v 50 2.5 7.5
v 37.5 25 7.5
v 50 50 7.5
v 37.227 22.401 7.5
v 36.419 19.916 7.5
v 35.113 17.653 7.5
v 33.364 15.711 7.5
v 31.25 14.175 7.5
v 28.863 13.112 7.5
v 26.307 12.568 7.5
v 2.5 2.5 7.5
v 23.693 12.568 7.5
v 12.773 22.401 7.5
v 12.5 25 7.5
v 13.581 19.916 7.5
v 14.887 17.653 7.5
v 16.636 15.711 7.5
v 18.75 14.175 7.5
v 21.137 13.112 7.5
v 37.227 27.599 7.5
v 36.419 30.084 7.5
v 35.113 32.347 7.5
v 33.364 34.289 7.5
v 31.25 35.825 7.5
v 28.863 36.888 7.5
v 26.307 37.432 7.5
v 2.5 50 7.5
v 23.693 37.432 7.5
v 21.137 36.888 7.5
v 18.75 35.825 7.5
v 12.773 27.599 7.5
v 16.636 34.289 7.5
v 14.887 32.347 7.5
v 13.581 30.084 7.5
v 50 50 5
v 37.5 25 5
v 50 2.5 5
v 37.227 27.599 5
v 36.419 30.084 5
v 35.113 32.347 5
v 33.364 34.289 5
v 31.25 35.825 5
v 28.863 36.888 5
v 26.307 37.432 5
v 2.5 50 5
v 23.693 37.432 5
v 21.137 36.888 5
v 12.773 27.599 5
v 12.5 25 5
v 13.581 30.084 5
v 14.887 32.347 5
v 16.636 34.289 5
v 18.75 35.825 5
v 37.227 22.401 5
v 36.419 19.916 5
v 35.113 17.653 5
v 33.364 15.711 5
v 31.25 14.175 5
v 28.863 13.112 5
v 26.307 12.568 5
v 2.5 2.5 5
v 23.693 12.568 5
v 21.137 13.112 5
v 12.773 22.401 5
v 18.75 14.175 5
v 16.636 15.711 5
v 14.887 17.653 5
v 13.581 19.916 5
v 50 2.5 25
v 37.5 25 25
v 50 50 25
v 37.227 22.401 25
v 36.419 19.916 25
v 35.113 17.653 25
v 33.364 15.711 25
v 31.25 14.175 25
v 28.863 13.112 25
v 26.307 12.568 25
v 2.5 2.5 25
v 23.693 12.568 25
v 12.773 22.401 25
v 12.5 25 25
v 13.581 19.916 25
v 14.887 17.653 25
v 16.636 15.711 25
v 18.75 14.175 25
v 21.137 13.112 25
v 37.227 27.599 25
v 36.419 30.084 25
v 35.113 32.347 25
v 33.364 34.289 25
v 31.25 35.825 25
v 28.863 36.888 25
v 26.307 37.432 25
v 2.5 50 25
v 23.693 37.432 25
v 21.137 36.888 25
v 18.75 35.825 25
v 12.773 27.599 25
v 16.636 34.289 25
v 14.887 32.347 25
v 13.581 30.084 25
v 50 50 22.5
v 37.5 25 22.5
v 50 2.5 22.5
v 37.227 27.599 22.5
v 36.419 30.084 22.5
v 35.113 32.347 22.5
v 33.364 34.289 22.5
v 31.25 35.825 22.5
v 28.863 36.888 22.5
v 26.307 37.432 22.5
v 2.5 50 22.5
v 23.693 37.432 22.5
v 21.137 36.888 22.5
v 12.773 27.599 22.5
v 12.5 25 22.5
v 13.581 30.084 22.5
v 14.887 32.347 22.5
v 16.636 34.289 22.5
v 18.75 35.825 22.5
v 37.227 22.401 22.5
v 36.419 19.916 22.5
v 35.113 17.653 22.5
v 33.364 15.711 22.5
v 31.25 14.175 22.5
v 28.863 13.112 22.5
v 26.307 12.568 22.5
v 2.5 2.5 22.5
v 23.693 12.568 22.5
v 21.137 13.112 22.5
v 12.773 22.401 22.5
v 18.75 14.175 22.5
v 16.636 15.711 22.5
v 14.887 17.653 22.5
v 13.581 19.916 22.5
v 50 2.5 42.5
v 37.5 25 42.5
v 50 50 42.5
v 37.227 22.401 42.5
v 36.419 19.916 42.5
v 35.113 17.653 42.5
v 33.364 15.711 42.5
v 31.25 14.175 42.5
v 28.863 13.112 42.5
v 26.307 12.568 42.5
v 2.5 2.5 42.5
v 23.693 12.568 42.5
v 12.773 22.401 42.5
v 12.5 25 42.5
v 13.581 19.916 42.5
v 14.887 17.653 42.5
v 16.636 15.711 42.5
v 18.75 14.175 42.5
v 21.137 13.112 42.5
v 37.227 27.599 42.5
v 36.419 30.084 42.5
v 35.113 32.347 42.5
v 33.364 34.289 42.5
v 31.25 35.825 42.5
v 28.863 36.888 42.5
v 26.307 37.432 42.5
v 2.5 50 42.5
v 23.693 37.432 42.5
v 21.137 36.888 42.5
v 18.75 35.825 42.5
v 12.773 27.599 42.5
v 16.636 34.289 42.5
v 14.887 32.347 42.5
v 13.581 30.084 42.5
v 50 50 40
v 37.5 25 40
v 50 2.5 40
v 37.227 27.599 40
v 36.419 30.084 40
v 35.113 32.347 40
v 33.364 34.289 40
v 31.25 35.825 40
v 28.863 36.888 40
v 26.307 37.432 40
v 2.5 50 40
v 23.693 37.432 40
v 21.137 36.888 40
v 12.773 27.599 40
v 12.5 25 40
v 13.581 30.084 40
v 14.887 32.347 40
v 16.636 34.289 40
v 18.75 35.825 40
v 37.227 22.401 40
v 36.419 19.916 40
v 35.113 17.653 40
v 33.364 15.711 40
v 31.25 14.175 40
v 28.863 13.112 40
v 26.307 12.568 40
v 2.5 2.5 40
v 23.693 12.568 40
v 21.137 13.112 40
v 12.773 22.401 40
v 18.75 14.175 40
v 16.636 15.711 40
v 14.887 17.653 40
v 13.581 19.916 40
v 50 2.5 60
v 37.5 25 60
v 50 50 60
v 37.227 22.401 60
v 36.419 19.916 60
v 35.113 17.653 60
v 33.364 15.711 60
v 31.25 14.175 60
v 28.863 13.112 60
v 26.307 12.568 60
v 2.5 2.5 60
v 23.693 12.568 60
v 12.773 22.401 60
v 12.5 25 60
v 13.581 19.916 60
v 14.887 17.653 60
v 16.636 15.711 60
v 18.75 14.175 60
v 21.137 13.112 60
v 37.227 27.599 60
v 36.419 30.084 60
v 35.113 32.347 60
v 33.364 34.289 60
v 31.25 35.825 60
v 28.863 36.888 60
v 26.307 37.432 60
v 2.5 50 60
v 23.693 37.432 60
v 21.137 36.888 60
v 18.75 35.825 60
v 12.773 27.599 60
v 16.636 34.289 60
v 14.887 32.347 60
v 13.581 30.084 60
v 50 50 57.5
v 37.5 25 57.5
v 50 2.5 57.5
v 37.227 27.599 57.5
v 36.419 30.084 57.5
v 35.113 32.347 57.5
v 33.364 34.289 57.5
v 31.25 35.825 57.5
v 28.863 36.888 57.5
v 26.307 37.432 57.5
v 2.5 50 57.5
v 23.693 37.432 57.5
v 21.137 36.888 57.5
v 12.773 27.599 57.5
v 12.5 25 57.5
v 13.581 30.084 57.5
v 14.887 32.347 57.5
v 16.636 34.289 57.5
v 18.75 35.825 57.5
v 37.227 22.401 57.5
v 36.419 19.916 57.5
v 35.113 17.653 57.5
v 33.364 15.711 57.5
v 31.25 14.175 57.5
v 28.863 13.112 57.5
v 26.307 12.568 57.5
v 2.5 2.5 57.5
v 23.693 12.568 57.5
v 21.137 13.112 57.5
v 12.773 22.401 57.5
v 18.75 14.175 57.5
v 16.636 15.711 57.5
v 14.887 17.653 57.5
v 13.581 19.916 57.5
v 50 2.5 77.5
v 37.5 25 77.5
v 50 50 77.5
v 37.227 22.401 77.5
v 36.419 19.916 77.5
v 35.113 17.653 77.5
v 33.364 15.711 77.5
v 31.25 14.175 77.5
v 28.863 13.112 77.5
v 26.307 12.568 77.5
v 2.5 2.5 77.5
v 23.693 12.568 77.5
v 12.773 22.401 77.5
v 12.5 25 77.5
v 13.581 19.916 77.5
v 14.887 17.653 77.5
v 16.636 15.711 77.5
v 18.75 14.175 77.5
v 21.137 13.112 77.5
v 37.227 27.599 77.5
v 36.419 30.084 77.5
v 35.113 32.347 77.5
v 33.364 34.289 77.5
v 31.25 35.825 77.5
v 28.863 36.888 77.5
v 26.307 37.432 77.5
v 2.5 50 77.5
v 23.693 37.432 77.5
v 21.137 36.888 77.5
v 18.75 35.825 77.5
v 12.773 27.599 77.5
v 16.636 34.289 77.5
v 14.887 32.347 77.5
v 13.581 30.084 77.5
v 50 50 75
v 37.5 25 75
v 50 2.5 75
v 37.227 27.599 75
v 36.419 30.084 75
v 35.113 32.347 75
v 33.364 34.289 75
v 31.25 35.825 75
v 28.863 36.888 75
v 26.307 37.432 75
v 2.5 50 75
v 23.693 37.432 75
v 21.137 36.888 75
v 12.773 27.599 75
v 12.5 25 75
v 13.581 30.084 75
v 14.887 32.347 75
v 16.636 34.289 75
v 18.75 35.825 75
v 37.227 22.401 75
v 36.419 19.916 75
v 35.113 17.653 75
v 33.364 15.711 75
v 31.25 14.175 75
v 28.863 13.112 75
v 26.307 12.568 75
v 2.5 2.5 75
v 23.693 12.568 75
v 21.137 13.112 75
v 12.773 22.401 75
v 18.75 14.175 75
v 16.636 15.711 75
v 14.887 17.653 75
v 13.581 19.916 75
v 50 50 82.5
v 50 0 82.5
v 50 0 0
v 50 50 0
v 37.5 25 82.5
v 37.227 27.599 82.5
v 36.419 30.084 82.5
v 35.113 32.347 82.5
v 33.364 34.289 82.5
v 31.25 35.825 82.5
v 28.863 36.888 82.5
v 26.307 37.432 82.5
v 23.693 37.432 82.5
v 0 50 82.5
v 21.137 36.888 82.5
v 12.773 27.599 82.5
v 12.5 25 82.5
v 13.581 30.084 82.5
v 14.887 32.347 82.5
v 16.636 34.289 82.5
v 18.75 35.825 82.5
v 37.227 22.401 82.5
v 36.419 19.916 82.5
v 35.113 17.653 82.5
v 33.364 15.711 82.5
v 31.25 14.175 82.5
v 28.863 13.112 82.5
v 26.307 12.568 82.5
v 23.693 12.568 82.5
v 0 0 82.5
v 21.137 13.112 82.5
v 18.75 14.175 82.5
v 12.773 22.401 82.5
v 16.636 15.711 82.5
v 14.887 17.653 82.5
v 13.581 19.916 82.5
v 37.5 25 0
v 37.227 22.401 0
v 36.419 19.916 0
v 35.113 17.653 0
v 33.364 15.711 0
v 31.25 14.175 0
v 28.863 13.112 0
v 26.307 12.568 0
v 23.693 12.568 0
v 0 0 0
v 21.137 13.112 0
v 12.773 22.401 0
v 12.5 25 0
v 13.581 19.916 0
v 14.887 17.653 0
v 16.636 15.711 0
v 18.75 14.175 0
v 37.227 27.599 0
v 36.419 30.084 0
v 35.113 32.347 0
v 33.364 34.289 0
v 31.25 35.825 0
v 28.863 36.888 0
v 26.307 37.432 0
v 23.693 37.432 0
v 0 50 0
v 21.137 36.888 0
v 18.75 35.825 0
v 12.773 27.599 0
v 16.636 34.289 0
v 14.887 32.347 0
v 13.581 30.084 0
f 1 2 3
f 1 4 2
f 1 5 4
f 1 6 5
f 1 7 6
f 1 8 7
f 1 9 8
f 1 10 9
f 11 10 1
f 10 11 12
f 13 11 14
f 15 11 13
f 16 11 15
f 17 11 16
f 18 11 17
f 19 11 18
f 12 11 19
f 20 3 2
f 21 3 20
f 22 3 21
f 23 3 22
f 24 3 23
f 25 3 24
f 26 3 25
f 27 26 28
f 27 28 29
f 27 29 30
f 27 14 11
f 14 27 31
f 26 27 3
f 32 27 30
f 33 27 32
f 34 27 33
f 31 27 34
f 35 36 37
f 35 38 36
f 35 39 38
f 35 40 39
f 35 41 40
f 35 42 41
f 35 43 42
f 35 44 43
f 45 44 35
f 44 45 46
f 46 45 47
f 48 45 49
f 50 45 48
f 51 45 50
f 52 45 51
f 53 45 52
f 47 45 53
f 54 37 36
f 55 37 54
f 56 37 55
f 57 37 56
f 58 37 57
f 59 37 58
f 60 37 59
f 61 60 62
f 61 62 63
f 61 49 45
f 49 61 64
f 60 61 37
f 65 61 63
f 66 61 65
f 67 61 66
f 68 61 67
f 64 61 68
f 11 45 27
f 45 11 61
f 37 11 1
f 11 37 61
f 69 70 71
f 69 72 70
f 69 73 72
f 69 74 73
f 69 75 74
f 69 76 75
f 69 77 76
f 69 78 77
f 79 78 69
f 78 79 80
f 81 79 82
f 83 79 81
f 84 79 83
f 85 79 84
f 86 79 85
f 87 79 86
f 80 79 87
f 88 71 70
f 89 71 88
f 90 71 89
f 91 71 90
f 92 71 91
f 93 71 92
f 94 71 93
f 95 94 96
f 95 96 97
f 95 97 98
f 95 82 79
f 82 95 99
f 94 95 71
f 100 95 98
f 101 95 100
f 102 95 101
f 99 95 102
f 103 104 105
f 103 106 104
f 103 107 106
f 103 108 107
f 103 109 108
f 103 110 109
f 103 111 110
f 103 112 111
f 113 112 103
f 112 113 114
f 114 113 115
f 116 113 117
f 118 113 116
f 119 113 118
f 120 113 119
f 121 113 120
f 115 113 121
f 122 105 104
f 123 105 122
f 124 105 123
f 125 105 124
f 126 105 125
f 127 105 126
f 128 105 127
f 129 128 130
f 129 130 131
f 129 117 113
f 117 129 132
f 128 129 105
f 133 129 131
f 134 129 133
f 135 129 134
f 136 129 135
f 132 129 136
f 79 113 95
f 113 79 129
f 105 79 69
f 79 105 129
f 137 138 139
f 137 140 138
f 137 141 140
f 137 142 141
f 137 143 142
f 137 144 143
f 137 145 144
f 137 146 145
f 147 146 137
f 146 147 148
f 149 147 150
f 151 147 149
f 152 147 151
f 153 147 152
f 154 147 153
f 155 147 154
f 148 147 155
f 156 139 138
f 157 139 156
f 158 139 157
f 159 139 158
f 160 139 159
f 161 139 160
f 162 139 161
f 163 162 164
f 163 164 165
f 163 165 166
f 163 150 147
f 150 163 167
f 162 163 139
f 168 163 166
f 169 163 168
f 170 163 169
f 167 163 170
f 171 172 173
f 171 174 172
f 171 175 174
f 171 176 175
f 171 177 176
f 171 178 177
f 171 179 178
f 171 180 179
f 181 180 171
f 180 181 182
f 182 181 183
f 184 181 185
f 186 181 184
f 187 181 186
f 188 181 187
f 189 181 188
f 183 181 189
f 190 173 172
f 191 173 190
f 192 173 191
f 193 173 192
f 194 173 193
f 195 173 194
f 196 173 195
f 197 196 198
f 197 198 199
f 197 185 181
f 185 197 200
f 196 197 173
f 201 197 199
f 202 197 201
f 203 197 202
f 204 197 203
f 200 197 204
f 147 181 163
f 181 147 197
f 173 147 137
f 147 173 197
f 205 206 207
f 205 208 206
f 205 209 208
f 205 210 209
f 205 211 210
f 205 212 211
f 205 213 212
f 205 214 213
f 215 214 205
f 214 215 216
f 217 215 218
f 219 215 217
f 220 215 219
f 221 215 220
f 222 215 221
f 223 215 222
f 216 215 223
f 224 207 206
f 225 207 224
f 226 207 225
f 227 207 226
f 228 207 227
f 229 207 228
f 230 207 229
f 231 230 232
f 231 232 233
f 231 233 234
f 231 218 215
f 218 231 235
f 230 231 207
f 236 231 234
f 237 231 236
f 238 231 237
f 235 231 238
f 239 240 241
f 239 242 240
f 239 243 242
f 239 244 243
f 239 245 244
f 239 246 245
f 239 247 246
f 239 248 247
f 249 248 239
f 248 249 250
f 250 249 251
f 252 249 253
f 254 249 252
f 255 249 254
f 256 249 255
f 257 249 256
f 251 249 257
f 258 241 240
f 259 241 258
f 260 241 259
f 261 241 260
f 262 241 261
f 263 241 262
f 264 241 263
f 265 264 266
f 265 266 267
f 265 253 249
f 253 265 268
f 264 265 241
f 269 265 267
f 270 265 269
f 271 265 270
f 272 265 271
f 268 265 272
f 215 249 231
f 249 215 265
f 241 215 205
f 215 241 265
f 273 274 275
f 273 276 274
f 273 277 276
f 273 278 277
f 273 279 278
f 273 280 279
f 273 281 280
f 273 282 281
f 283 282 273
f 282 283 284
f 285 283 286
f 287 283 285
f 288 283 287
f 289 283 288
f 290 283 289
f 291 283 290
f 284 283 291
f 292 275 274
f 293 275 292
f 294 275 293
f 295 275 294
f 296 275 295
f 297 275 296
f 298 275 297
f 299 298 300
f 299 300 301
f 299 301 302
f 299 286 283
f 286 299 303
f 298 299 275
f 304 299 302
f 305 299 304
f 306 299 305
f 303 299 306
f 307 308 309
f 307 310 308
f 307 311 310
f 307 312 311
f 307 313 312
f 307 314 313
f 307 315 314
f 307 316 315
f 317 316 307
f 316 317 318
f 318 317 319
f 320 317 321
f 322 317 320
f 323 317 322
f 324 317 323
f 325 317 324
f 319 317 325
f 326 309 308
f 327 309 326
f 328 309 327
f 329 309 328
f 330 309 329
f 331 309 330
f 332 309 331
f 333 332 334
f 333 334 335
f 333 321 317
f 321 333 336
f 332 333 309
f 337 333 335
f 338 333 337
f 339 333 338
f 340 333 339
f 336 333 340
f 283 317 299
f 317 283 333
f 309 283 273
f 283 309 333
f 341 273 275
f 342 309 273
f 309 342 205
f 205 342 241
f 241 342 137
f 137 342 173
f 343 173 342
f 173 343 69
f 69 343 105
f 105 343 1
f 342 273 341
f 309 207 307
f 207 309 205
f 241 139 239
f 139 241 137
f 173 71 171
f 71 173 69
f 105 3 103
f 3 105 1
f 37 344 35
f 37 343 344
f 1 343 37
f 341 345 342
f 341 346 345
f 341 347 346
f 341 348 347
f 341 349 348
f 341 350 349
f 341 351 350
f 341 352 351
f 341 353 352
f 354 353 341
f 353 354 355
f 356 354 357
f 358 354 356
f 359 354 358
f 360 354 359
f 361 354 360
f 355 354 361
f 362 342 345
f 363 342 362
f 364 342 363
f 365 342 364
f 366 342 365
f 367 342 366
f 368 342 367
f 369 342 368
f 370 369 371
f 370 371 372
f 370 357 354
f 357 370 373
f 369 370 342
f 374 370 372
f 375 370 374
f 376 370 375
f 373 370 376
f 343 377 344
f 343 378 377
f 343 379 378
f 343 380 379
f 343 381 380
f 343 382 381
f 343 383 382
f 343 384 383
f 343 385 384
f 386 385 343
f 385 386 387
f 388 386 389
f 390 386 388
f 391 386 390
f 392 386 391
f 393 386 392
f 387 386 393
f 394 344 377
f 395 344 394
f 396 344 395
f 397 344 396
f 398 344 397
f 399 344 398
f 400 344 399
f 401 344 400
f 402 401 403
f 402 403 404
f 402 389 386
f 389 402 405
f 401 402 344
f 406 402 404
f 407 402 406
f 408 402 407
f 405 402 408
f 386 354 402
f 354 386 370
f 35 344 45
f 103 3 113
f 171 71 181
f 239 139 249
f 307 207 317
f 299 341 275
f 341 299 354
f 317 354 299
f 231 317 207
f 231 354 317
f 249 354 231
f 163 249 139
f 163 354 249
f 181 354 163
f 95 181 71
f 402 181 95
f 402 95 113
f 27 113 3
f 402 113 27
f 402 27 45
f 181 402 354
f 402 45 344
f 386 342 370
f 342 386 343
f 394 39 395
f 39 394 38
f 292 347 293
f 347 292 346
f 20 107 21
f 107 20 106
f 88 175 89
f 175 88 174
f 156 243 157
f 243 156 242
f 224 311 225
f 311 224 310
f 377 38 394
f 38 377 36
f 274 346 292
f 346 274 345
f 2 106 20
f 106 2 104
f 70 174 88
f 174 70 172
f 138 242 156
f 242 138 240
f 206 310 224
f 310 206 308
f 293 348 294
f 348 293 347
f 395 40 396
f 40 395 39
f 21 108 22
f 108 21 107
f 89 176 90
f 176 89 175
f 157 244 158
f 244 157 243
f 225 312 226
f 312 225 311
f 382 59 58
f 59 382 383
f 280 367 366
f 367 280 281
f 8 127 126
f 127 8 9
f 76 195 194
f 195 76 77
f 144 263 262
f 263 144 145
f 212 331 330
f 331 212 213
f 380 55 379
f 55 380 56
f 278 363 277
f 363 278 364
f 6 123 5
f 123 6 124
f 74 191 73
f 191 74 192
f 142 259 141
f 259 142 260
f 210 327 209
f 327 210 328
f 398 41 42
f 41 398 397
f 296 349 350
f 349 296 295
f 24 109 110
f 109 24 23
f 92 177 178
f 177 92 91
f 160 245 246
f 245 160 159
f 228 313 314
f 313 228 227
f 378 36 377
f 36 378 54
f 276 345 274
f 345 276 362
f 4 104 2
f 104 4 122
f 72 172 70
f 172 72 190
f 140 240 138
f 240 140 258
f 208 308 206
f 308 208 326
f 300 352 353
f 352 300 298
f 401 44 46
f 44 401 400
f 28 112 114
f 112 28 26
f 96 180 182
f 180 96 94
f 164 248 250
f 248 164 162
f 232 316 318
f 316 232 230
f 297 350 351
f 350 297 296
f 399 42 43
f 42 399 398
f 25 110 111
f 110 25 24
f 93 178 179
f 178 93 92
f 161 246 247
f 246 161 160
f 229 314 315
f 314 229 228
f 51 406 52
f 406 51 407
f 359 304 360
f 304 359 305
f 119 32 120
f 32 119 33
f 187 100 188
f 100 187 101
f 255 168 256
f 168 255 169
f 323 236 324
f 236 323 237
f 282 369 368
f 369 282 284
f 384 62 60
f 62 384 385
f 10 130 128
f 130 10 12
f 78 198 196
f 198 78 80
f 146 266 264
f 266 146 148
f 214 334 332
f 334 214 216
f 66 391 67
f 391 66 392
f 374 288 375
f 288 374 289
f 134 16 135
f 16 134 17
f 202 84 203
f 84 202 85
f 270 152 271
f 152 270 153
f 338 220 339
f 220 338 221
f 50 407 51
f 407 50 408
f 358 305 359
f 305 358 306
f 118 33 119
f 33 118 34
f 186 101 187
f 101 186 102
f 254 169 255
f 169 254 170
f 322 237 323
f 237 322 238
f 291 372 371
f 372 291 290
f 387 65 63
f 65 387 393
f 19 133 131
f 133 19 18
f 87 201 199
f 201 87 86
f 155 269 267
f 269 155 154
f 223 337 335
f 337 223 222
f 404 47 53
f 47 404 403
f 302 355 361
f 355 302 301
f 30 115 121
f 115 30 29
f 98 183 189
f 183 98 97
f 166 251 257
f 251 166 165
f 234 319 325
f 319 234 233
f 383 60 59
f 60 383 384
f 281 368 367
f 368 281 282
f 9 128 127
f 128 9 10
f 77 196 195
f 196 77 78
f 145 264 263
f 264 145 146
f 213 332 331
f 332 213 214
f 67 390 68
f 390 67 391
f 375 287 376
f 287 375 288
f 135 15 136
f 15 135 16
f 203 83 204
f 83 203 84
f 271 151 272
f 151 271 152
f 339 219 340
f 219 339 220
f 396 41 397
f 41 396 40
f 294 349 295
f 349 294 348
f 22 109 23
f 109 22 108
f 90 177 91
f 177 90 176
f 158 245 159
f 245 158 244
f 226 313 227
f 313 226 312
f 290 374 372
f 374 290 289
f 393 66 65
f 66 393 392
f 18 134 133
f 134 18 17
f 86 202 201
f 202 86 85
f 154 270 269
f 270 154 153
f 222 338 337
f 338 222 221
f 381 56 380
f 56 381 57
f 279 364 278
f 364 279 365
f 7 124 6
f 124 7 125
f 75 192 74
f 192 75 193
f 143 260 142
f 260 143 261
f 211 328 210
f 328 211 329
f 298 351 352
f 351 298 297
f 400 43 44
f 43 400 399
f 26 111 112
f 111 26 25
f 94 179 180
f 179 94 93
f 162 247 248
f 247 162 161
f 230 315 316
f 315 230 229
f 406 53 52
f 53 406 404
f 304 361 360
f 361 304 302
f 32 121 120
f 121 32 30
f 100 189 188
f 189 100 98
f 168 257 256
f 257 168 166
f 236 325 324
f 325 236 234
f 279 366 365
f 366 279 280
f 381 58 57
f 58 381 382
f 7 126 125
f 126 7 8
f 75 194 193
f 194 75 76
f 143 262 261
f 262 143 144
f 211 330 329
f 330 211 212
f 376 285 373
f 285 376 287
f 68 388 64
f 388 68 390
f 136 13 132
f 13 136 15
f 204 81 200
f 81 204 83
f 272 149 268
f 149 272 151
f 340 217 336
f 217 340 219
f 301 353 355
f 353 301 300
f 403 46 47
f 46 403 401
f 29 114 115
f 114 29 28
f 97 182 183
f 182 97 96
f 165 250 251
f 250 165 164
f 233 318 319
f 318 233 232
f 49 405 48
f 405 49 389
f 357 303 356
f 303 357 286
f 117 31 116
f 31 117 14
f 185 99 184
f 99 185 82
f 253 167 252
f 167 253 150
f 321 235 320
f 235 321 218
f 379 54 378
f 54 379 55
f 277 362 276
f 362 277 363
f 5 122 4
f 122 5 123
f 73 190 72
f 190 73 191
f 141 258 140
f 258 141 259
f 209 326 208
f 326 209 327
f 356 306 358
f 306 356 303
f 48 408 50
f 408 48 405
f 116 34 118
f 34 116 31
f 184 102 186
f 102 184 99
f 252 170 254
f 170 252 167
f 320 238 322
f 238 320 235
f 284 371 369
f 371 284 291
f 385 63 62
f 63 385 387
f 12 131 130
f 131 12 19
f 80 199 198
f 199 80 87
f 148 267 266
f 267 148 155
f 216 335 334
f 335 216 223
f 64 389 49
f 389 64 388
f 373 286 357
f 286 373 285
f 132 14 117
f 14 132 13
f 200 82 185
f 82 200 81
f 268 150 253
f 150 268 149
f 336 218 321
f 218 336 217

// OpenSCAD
plates = 5;
space = 15;
plate_h = 2.5;
h = 5*2 + (plates-1)*(space+plate_h)+plate_h;
difference() {
    cube([50, 50, h]);
    for(a=[5: space+plate_h : h]) {
        translate([plate_h, plate_h, a])
            cube([50, 50, plate_h]);
    }
    translate([25, 25, 0])
        cylinder(h=h, d=25);
}
